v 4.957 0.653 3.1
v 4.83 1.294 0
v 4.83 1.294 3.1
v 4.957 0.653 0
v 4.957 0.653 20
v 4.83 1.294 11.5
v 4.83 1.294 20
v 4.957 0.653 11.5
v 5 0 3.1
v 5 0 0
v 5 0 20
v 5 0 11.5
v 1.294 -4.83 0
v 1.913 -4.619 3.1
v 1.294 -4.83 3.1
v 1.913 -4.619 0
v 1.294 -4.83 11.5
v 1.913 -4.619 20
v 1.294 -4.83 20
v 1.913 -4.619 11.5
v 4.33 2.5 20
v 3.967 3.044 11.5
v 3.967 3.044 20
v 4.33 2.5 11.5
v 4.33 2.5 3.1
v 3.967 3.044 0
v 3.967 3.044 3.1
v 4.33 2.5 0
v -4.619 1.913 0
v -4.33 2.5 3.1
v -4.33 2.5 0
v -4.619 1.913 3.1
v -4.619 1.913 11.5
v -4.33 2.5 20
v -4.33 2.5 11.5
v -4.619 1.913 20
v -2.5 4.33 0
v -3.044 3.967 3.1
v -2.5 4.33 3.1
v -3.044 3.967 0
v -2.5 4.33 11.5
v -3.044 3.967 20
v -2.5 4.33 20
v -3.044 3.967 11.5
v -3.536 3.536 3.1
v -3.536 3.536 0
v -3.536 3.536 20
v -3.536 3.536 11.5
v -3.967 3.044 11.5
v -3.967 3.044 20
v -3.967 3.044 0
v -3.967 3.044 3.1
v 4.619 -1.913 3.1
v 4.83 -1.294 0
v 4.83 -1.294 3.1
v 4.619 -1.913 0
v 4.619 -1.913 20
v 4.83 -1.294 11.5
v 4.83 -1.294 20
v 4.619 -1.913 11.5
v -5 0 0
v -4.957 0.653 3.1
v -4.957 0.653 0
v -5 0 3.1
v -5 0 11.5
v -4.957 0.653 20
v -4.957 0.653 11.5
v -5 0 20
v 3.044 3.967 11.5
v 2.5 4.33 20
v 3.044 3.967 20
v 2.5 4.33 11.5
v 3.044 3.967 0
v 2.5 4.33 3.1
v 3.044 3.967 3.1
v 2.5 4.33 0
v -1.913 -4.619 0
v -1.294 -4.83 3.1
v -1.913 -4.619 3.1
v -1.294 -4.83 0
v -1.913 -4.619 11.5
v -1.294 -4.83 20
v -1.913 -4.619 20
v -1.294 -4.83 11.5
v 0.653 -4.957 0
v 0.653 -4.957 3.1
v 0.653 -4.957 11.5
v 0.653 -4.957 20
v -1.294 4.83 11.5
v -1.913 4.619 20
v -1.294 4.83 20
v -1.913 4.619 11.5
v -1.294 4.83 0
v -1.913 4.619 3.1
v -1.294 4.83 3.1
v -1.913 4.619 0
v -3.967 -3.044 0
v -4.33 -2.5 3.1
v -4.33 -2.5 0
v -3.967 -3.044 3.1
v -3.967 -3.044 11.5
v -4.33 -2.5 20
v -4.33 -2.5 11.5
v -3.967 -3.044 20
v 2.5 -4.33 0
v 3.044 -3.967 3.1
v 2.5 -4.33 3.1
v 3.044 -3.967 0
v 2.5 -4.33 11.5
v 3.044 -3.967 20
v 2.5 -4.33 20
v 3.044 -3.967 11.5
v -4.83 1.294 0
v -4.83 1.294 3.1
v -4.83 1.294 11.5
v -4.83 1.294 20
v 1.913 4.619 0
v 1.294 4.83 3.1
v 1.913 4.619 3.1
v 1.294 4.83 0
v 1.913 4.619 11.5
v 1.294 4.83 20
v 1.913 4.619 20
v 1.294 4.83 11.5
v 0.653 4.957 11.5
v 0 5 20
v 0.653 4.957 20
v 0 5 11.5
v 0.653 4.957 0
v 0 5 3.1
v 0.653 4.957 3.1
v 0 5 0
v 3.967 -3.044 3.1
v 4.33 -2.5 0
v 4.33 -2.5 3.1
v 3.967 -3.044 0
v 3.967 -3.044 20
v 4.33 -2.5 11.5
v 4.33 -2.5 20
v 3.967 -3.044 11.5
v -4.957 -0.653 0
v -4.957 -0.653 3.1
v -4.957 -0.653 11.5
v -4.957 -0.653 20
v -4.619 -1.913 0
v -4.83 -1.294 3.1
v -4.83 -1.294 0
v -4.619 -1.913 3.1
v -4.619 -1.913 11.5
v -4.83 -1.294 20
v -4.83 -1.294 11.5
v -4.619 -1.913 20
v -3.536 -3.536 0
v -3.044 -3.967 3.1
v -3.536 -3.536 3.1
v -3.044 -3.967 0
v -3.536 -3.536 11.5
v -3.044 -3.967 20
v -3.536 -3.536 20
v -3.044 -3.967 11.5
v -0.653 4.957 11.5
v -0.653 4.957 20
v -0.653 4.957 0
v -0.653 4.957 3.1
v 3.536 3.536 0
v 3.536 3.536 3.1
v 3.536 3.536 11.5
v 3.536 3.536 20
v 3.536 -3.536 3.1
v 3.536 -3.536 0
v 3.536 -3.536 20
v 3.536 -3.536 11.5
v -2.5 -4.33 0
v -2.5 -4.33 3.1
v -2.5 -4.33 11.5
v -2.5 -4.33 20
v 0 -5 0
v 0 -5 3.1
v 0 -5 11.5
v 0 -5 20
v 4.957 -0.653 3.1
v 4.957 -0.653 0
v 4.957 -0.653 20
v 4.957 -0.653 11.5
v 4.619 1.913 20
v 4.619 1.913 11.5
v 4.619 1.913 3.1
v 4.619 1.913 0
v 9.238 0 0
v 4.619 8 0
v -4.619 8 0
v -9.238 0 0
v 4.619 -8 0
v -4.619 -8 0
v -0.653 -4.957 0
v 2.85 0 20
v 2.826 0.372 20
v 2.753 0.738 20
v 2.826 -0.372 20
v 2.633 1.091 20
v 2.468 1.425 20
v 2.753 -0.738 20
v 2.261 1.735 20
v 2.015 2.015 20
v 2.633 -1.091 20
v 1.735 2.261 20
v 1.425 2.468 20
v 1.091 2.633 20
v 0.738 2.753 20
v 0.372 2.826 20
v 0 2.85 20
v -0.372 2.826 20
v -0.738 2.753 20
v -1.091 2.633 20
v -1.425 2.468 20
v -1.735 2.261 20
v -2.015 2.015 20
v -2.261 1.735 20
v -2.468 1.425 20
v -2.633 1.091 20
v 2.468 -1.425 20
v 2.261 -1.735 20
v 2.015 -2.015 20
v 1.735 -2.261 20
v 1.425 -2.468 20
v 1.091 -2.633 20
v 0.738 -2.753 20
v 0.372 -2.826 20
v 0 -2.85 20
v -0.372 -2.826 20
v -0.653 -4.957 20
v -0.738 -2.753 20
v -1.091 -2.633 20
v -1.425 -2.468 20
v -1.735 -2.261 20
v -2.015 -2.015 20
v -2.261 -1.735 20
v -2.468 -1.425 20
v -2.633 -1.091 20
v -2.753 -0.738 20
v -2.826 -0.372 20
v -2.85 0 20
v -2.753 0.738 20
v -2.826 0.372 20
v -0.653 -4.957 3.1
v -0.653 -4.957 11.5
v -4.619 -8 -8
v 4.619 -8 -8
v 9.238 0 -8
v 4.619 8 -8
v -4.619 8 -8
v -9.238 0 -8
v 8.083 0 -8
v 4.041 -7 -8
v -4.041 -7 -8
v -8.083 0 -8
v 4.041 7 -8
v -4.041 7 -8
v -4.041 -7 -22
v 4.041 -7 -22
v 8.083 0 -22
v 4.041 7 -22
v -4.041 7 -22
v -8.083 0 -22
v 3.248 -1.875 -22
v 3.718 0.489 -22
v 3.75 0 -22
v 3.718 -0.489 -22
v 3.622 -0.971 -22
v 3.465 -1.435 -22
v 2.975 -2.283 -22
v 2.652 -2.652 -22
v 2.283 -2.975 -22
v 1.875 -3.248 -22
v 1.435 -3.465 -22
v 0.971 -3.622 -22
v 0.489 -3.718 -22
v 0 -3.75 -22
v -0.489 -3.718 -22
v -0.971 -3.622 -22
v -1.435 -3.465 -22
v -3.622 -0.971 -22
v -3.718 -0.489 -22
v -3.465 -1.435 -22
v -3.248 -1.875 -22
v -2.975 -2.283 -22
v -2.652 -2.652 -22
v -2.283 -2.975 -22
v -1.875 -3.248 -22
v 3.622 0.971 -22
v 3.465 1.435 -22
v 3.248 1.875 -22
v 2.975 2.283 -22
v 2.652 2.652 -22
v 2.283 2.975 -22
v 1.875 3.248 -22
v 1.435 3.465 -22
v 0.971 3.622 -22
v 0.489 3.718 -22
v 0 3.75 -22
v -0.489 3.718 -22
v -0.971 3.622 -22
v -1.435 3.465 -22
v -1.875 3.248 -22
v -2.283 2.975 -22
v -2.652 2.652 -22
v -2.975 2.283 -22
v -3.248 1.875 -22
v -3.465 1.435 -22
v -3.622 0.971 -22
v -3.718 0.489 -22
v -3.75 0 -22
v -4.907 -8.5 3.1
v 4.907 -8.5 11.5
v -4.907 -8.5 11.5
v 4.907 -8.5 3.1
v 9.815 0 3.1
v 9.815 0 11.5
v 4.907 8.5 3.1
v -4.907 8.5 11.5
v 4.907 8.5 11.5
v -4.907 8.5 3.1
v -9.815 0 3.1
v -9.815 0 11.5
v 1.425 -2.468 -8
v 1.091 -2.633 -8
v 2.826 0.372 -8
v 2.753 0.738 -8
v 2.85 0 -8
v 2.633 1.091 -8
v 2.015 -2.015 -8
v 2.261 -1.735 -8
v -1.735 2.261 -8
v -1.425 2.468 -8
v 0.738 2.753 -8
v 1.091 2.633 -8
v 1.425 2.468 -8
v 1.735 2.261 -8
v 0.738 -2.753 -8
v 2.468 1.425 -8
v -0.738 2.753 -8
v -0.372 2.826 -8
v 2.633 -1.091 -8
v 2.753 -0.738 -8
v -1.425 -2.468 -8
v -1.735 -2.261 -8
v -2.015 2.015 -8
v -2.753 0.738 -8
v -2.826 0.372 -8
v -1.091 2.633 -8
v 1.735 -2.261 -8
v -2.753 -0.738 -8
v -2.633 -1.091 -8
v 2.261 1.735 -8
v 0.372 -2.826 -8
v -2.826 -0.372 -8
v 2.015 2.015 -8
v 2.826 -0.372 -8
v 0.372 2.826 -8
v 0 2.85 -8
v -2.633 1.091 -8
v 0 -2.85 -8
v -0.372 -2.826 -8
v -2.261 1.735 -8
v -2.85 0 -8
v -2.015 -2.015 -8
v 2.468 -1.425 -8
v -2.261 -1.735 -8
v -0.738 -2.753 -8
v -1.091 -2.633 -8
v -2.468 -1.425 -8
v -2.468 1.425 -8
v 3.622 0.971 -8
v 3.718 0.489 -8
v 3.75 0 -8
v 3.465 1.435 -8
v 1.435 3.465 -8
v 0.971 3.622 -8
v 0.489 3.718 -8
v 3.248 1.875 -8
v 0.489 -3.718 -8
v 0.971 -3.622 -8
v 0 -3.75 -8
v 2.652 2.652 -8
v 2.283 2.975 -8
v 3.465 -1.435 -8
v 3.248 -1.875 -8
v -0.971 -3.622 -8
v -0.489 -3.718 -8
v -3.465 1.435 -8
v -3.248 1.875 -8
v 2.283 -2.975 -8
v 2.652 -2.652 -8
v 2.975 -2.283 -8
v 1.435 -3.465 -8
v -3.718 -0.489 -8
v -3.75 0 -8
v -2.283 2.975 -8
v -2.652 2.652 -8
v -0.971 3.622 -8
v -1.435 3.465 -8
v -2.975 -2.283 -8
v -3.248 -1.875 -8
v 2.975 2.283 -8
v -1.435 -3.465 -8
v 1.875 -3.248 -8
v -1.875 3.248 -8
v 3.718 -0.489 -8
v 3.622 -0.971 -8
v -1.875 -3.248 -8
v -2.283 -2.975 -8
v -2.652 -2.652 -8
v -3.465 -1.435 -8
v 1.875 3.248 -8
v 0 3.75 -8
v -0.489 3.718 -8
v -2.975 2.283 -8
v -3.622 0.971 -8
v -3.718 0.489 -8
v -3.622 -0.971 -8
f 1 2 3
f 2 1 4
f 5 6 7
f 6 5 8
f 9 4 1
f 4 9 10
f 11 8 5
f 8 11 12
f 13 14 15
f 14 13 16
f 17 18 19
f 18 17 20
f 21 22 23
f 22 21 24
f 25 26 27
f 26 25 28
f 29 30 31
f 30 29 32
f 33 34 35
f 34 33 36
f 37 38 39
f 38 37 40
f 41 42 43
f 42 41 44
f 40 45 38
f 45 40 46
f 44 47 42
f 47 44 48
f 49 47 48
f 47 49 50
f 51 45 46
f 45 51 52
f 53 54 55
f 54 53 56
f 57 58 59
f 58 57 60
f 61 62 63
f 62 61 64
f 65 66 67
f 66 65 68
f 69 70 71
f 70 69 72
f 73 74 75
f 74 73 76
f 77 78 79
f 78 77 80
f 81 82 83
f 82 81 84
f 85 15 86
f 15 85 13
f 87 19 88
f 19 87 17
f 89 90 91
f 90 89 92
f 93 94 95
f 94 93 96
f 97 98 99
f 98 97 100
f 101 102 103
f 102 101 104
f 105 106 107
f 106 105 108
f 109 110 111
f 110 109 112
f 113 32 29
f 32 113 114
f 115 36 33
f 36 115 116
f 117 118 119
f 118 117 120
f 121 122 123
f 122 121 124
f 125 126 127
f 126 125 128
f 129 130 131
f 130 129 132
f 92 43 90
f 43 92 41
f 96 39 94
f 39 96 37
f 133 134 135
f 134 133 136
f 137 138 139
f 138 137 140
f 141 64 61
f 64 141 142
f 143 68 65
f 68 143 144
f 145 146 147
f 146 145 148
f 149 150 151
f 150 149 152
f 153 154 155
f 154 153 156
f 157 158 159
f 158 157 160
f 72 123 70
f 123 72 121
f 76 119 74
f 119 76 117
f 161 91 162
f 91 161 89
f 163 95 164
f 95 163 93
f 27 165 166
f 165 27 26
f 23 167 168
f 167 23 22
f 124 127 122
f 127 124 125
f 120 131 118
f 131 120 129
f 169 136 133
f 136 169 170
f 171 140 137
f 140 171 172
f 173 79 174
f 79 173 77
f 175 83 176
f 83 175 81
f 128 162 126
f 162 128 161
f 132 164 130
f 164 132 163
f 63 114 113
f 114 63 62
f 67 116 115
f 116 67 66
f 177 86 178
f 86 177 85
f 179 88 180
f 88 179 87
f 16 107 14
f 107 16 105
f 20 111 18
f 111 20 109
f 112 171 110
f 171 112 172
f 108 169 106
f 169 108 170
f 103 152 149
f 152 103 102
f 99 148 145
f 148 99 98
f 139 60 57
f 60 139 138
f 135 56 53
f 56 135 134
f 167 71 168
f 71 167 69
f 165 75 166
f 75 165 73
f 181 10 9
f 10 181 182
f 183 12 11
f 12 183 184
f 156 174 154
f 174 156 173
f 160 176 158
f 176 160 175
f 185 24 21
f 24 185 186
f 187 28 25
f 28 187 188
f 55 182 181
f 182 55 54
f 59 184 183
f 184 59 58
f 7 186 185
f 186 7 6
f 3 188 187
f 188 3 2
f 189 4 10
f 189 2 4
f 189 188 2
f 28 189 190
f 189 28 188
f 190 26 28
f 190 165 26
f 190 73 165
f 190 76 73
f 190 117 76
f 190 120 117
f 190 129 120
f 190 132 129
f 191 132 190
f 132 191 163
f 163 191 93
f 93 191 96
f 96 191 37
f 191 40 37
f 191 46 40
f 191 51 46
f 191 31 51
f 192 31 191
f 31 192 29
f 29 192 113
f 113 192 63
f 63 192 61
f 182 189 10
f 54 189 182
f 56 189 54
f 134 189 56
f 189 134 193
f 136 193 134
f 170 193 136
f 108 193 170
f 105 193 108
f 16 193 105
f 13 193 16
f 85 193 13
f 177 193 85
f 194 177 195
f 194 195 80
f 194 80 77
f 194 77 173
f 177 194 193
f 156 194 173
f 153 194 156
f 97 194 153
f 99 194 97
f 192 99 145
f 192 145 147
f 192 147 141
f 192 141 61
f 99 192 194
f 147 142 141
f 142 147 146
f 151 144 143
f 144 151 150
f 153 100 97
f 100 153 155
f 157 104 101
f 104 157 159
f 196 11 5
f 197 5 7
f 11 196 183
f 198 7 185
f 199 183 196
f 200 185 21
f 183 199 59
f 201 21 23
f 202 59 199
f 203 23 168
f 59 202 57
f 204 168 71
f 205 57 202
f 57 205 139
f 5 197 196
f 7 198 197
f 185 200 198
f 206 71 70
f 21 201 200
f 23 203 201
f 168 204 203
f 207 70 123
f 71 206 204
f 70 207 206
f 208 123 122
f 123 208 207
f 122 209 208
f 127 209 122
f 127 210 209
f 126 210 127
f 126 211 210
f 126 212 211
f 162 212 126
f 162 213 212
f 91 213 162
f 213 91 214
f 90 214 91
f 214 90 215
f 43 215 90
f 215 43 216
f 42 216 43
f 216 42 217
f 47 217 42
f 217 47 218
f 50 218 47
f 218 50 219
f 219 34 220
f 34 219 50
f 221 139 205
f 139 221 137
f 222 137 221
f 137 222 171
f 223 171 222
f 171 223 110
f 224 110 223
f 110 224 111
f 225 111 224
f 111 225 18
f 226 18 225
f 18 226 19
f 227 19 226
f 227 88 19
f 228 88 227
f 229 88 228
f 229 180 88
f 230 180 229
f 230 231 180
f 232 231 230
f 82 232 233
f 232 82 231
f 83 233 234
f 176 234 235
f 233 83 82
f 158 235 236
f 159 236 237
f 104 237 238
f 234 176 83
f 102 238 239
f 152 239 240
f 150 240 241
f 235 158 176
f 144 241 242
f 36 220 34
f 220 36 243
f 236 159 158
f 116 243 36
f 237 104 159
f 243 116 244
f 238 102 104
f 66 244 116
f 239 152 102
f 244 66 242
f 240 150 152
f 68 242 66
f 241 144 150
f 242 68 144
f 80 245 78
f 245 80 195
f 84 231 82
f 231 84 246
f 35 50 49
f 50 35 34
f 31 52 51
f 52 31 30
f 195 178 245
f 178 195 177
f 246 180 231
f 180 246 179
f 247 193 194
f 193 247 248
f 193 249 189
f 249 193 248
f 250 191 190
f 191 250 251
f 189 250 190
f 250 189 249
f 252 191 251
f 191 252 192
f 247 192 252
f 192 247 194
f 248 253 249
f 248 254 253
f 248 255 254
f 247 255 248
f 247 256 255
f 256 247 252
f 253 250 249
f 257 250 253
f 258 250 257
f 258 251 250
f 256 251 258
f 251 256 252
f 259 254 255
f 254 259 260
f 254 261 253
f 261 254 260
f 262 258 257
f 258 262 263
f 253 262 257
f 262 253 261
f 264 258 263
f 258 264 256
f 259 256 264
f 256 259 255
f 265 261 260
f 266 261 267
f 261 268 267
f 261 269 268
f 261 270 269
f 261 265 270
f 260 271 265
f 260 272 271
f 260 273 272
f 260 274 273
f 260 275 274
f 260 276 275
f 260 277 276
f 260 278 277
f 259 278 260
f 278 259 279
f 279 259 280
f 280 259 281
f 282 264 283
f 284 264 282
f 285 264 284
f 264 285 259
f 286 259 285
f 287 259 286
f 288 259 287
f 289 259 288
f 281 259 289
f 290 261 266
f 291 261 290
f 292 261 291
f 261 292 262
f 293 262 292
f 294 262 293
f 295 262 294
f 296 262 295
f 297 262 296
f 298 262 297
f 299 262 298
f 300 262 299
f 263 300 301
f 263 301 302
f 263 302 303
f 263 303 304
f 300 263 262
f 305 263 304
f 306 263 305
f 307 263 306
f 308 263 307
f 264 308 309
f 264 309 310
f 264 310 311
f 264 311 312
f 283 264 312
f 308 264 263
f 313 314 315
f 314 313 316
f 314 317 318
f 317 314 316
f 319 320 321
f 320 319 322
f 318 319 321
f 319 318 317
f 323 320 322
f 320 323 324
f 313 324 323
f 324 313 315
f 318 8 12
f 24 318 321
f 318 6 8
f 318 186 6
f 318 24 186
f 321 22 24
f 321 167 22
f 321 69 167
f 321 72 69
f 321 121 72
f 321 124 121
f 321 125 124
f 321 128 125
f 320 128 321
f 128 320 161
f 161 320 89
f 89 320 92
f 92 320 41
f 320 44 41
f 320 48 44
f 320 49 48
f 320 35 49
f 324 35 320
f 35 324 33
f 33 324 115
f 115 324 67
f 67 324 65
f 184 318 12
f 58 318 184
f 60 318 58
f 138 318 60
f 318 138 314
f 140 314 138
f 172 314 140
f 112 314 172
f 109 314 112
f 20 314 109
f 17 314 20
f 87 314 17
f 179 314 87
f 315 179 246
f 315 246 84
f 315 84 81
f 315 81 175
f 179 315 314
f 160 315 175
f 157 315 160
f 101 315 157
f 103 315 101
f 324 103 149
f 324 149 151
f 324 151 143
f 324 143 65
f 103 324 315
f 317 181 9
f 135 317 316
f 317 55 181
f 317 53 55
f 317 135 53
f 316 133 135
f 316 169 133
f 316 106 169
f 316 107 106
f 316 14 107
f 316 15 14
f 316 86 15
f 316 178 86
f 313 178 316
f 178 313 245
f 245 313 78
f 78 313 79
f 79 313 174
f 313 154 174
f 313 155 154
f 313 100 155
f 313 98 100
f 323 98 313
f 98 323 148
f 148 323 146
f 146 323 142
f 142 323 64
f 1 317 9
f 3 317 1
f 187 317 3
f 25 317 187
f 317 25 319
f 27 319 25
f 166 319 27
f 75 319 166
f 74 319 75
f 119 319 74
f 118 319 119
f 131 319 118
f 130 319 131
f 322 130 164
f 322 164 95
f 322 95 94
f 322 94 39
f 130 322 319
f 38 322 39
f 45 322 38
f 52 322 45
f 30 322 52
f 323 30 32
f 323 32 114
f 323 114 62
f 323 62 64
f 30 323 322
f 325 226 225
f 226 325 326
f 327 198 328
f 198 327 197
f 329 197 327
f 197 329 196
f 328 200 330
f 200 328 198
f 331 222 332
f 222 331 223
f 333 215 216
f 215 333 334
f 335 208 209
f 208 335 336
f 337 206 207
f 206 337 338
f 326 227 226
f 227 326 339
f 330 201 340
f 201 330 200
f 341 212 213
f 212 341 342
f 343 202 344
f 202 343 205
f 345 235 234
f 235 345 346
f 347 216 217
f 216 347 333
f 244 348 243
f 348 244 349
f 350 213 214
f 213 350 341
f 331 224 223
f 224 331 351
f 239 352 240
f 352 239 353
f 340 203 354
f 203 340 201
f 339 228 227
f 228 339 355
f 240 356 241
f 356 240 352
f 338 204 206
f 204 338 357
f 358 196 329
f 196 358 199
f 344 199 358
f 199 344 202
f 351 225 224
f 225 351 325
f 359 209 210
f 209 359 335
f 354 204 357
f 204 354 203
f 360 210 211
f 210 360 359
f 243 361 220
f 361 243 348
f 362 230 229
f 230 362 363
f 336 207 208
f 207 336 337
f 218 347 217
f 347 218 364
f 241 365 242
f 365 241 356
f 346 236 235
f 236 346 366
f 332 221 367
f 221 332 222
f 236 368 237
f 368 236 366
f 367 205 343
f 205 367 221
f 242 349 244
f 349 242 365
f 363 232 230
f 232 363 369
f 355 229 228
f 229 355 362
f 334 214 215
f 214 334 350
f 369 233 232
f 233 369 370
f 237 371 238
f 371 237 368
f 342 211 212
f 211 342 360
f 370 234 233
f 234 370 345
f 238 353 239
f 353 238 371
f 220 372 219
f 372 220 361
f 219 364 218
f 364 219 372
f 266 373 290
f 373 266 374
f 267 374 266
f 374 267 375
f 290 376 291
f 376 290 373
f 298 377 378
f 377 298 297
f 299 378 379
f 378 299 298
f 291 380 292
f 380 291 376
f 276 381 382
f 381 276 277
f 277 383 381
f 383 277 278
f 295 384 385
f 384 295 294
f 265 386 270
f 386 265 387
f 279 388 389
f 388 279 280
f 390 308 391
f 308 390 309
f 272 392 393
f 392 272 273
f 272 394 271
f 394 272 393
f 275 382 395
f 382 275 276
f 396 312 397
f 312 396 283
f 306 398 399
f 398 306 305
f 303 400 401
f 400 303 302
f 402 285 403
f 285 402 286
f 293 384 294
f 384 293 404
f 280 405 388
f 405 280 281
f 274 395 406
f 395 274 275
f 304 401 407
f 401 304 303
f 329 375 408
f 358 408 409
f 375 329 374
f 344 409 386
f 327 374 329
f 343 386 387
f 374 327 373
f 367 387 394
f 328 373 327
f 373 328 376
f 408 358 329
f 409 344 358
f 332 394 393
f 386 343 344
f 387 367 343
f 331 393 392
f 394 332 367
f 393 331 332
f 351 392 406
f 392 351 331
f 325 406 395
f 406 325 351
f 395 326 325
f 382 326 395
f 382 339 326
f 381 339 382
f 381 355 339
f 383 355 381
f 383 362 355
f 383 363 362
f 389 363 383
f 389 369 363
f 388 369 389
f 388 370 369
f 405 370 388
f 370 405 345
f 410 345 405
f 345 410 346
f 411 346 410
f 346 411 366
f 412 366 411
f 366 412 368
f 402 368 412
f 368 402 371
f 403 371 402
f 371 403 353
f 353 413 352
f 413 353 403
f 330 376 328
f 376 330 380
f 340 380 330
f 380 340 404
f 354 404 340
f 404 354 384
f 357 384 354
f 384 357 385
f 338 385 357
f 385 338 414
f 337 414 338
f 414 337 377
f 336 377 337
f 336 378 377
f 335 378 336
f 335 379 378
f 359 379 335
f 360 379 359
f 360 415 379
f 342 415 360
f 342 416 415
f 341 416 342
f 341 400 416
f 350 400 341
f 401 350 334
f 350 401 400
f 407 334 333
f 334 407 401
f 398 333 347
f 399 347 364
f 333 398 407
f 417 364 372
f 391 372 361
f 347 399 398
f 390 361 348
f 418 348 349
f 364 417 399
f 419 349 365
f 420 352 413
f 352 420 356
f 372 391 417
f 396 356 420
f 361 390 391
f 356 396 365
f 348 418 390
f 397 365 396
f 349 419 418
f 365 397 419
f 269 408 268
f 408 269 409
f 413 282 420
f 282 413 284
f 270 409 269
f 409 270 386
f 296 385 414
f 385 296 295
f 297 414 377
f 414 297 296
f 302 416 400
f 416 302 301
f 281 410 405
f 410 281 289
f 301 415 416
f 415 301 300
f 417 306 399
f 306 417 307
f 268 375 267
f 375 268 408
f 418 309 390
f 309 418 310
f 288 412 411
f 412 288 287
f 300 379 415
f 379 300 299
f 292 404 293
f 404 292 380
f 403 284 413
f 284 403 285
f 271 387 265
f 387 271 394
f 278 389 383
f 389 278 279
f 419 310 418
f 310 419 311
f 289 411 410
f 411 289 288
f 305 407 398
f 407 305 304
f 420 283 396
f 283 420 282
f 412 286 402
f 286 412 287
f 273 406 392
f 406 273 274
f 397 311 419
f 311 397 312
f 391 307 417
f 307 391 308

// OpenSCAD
// =====================================================================
// wetlink_penetrator_m10_ref.scad — Blue Robotics WetLink Penetrator M10
//                                    **参考モデル (購入品の代用)**
//
// ベンダの 3D データは未入手。メーカー公開値 (製品ページ / 組立ガイド) から
// 起こした「場所を取るぶんだけ正しい」空間占有モデル。
//   確定値 (ベンダ公称):  M10x1.5 / ねじ長 20 / 六角 AF16 / 外側総高 18-26 /
//                        取付穴 10.0-10.2 / O リング AS568-013 (OD 15.98)
//   仮値   (**要確認**):  頭の高さ head_h、プラグ AF、ナット、導体ボア径
// 実物入手後は実測して直すこと。ベンダ STEP が出たら差し替える。
//
// ファイル名を意図的にフォルダ名と変えてある → build.ps1 の一括ビルド対象外。
// 個別ビルド:  .\build.ps1 parts\common\exterior\cots\wetlink_penetrator_m10\wetlink_penetrator_m10_ref.scad
//
// 座標系: 軸 = Z。**z=0 = 壁の外面 (= O リング座面)**、+Z が容器の内側。
//   z < 0        : 濡れ側 (六角頭 + プラグ)。ケーブルはここから入る
//   0 .. wall_t  : 壁の中 (バカ穴 Ø10.2)
//   wall_t ..    : 乾き側 (残ったねじ + ナット)。ここから出るのは**素の導体**
//
// !! 向きを間違えないこと: O リング座面 (頭側) は必ず**外**。
//    ガイド曰く "only the cable side of the penetrator is sealed.
//    The back side - where the wires exit - is not sealed and must stay dry."
//    → 容器内でケーブル外被は終わる。TD04A の 3P プラグは通らないので
//      ケーブルを切って容器内で端子台に落とす前提 (td04a_transducer.md 参照)。
// =====================================================================

/* [ベンダ公称値 (確定)] */
thread_d  = 10;      // M10 x 1.5 呼び径
thread_l  = 20;      // ねじ長 (製品ページ "20 mm")
hex_af    = 16;      // バルクヘッド六角 二面幅 (組立ガイド "Hex Size (Bulkhead) M10 = 16 mm")
plug_af   = 14;      // プラグ六角 二面幅 (同 "11-14 mm" の上限)
out_h     = 22;      // 壁外面から出る総高 (製品ページ "18-26 mm from Endcap" の中央)
hole_d    = 10.2;    // 相手側のバカ穴 (10.0-10.2)
oring_od  = 15.98;   // AS568-013 (ID 12.42 + 線径 1.78 x2)

/* [仮値 — **要確認** (実測 or ベンダ図面待ち)] */
head_h    = 8;       // 六角頭の高さ (**要確認**)。プラグ高 = out_h - head_h
nut_af    = 17;      // 付属ナット 二面幅 (ISO 4032 M10 = 17) (**要確認**)
nut_h     = 8.4;     // 同 厚さ (ISO 4032 M10 = 8.4) (**要確認**)
bore_d    = 5.7;     // 導体ボア (**ケーブル未選定**: 7.5mm シールの 5.7 を仮置き)
cable_d   = 7.5;     // プラグに入るケーブル外被 Ø (**未選定**: 4.5-8.5 のどれか)

/* [取付先の壁] — ナットの位置だけがこの値で決まる */
// **アセンブリでは「相手モデルの壁厚」に合わせること** (実壁厚ではない)。
//   タカチ BCAS212310G は実壁 3.08 だが、bcas212310g.scad の内腔は図面の
//   「有効内寸 217.8」基準なので**モデル上の壁は 6.1**。モデル整合を優先し、
//   variants.txt の bcas = 6.1 を親機アセンブリで使う。
//   → 実機ではナットが 3mm 外側 (箱内 y≈3.1..11.5) に来る。
//     内側クリアランスもねじ掛かりもモデルより広い = モデルは保守側。
//   子機 wte4_end_cap_5xm10 は t10 の M10 タップ穴なのでナット無し (別途モデル化)。
wall_t    = 3.1;
show_nut = true; // false: reuse the existing body with a separate vendor nut

$fn = 48;

// ---- 導出値 ---------------------------------------------------------
plug_h  = out_h - head_h;          // 14
in_len  = thread_l - wall_t;       // 壁の内側に出るねじの長さ = 16.9
nut_z1  = wall_t + nut_h;          // ナット上端 (容器内へ 11.5)
hex_od  = hex_af / cos(30);        // 18.475 (製品ページの "Outer diameter 18 mm")

// ---- 整合チェック ---------------------------------------------------
assert(thread_l > wall_t + nut_h + 2,
       str("壁が厚すぎてナットが掛からない: ねじ長 ", thread_l, " / 壁 ", wall_t));
assert(out_h >= 18 && out_h <= 26, "外側総高がベンダ公称の 18-26 mm を外れている");
assert(head_h > 0 && plug_h > 0, "head_h が out_h を超えている");
assert(oring_od <= hex_af, "O リング (OD 15.98) が六角の二面幅に収まらない = 座面が足りない");
assert(hole_d > thread_d && hole_d - thread_d < 0.5, "取付穴がねじに対して不適切");
assert(cable_d < bore_d + 2.5 && bore_d < thread_d - 2.6, "ボア/ケーブル径がバルクヘッド肉厚を食う");
assert(nut_af > hex_af - 2, "ナットが頭より極端に小さい (モデルの取り違え)");

echo(str("wetlink_penetrator_m10_ref: 外 z=", -out_h, "..0 (Ø", hex_od,
         ") / 壁 0..", wall_t, " / 内 ねじ ", in_len, " ナット上端 z=", nut_z1,
         " (Ø", nut_af/cos(30), ")  取付穴 Ø", hole_d));

module hexp(af, h) cylinder(d = af / cos(30), h = h, $fn = 6);

difference() {
    union() {
        cylinder(d = thread_d, h = thread_l);              // ねじ部 (山は省略)
        translate([0, 0, -head_h])      hexp(hex_af,  head_h);   // 六角頭 (濡れ側)
        translate([0, 0, -out_h])       hexp(plug_af, plug_h);   // プラグ (濡れ側)
        if (show_nut) translate([0, 0, wall_t]) hexp(nut_af, nut_h); // ナット (乾き側)
    }
    // 導体ボア (貫通)
    translate([0, 0, -out_h - 1]) cylinder(d = bore_d, h = out_h + thread_l + 2);
    // ケーブル外被が入るプラグ側のボア
    translate([0, 0, -out_h - 1]) cylinder(d = cable_d, h = plug_h + 1);
}
